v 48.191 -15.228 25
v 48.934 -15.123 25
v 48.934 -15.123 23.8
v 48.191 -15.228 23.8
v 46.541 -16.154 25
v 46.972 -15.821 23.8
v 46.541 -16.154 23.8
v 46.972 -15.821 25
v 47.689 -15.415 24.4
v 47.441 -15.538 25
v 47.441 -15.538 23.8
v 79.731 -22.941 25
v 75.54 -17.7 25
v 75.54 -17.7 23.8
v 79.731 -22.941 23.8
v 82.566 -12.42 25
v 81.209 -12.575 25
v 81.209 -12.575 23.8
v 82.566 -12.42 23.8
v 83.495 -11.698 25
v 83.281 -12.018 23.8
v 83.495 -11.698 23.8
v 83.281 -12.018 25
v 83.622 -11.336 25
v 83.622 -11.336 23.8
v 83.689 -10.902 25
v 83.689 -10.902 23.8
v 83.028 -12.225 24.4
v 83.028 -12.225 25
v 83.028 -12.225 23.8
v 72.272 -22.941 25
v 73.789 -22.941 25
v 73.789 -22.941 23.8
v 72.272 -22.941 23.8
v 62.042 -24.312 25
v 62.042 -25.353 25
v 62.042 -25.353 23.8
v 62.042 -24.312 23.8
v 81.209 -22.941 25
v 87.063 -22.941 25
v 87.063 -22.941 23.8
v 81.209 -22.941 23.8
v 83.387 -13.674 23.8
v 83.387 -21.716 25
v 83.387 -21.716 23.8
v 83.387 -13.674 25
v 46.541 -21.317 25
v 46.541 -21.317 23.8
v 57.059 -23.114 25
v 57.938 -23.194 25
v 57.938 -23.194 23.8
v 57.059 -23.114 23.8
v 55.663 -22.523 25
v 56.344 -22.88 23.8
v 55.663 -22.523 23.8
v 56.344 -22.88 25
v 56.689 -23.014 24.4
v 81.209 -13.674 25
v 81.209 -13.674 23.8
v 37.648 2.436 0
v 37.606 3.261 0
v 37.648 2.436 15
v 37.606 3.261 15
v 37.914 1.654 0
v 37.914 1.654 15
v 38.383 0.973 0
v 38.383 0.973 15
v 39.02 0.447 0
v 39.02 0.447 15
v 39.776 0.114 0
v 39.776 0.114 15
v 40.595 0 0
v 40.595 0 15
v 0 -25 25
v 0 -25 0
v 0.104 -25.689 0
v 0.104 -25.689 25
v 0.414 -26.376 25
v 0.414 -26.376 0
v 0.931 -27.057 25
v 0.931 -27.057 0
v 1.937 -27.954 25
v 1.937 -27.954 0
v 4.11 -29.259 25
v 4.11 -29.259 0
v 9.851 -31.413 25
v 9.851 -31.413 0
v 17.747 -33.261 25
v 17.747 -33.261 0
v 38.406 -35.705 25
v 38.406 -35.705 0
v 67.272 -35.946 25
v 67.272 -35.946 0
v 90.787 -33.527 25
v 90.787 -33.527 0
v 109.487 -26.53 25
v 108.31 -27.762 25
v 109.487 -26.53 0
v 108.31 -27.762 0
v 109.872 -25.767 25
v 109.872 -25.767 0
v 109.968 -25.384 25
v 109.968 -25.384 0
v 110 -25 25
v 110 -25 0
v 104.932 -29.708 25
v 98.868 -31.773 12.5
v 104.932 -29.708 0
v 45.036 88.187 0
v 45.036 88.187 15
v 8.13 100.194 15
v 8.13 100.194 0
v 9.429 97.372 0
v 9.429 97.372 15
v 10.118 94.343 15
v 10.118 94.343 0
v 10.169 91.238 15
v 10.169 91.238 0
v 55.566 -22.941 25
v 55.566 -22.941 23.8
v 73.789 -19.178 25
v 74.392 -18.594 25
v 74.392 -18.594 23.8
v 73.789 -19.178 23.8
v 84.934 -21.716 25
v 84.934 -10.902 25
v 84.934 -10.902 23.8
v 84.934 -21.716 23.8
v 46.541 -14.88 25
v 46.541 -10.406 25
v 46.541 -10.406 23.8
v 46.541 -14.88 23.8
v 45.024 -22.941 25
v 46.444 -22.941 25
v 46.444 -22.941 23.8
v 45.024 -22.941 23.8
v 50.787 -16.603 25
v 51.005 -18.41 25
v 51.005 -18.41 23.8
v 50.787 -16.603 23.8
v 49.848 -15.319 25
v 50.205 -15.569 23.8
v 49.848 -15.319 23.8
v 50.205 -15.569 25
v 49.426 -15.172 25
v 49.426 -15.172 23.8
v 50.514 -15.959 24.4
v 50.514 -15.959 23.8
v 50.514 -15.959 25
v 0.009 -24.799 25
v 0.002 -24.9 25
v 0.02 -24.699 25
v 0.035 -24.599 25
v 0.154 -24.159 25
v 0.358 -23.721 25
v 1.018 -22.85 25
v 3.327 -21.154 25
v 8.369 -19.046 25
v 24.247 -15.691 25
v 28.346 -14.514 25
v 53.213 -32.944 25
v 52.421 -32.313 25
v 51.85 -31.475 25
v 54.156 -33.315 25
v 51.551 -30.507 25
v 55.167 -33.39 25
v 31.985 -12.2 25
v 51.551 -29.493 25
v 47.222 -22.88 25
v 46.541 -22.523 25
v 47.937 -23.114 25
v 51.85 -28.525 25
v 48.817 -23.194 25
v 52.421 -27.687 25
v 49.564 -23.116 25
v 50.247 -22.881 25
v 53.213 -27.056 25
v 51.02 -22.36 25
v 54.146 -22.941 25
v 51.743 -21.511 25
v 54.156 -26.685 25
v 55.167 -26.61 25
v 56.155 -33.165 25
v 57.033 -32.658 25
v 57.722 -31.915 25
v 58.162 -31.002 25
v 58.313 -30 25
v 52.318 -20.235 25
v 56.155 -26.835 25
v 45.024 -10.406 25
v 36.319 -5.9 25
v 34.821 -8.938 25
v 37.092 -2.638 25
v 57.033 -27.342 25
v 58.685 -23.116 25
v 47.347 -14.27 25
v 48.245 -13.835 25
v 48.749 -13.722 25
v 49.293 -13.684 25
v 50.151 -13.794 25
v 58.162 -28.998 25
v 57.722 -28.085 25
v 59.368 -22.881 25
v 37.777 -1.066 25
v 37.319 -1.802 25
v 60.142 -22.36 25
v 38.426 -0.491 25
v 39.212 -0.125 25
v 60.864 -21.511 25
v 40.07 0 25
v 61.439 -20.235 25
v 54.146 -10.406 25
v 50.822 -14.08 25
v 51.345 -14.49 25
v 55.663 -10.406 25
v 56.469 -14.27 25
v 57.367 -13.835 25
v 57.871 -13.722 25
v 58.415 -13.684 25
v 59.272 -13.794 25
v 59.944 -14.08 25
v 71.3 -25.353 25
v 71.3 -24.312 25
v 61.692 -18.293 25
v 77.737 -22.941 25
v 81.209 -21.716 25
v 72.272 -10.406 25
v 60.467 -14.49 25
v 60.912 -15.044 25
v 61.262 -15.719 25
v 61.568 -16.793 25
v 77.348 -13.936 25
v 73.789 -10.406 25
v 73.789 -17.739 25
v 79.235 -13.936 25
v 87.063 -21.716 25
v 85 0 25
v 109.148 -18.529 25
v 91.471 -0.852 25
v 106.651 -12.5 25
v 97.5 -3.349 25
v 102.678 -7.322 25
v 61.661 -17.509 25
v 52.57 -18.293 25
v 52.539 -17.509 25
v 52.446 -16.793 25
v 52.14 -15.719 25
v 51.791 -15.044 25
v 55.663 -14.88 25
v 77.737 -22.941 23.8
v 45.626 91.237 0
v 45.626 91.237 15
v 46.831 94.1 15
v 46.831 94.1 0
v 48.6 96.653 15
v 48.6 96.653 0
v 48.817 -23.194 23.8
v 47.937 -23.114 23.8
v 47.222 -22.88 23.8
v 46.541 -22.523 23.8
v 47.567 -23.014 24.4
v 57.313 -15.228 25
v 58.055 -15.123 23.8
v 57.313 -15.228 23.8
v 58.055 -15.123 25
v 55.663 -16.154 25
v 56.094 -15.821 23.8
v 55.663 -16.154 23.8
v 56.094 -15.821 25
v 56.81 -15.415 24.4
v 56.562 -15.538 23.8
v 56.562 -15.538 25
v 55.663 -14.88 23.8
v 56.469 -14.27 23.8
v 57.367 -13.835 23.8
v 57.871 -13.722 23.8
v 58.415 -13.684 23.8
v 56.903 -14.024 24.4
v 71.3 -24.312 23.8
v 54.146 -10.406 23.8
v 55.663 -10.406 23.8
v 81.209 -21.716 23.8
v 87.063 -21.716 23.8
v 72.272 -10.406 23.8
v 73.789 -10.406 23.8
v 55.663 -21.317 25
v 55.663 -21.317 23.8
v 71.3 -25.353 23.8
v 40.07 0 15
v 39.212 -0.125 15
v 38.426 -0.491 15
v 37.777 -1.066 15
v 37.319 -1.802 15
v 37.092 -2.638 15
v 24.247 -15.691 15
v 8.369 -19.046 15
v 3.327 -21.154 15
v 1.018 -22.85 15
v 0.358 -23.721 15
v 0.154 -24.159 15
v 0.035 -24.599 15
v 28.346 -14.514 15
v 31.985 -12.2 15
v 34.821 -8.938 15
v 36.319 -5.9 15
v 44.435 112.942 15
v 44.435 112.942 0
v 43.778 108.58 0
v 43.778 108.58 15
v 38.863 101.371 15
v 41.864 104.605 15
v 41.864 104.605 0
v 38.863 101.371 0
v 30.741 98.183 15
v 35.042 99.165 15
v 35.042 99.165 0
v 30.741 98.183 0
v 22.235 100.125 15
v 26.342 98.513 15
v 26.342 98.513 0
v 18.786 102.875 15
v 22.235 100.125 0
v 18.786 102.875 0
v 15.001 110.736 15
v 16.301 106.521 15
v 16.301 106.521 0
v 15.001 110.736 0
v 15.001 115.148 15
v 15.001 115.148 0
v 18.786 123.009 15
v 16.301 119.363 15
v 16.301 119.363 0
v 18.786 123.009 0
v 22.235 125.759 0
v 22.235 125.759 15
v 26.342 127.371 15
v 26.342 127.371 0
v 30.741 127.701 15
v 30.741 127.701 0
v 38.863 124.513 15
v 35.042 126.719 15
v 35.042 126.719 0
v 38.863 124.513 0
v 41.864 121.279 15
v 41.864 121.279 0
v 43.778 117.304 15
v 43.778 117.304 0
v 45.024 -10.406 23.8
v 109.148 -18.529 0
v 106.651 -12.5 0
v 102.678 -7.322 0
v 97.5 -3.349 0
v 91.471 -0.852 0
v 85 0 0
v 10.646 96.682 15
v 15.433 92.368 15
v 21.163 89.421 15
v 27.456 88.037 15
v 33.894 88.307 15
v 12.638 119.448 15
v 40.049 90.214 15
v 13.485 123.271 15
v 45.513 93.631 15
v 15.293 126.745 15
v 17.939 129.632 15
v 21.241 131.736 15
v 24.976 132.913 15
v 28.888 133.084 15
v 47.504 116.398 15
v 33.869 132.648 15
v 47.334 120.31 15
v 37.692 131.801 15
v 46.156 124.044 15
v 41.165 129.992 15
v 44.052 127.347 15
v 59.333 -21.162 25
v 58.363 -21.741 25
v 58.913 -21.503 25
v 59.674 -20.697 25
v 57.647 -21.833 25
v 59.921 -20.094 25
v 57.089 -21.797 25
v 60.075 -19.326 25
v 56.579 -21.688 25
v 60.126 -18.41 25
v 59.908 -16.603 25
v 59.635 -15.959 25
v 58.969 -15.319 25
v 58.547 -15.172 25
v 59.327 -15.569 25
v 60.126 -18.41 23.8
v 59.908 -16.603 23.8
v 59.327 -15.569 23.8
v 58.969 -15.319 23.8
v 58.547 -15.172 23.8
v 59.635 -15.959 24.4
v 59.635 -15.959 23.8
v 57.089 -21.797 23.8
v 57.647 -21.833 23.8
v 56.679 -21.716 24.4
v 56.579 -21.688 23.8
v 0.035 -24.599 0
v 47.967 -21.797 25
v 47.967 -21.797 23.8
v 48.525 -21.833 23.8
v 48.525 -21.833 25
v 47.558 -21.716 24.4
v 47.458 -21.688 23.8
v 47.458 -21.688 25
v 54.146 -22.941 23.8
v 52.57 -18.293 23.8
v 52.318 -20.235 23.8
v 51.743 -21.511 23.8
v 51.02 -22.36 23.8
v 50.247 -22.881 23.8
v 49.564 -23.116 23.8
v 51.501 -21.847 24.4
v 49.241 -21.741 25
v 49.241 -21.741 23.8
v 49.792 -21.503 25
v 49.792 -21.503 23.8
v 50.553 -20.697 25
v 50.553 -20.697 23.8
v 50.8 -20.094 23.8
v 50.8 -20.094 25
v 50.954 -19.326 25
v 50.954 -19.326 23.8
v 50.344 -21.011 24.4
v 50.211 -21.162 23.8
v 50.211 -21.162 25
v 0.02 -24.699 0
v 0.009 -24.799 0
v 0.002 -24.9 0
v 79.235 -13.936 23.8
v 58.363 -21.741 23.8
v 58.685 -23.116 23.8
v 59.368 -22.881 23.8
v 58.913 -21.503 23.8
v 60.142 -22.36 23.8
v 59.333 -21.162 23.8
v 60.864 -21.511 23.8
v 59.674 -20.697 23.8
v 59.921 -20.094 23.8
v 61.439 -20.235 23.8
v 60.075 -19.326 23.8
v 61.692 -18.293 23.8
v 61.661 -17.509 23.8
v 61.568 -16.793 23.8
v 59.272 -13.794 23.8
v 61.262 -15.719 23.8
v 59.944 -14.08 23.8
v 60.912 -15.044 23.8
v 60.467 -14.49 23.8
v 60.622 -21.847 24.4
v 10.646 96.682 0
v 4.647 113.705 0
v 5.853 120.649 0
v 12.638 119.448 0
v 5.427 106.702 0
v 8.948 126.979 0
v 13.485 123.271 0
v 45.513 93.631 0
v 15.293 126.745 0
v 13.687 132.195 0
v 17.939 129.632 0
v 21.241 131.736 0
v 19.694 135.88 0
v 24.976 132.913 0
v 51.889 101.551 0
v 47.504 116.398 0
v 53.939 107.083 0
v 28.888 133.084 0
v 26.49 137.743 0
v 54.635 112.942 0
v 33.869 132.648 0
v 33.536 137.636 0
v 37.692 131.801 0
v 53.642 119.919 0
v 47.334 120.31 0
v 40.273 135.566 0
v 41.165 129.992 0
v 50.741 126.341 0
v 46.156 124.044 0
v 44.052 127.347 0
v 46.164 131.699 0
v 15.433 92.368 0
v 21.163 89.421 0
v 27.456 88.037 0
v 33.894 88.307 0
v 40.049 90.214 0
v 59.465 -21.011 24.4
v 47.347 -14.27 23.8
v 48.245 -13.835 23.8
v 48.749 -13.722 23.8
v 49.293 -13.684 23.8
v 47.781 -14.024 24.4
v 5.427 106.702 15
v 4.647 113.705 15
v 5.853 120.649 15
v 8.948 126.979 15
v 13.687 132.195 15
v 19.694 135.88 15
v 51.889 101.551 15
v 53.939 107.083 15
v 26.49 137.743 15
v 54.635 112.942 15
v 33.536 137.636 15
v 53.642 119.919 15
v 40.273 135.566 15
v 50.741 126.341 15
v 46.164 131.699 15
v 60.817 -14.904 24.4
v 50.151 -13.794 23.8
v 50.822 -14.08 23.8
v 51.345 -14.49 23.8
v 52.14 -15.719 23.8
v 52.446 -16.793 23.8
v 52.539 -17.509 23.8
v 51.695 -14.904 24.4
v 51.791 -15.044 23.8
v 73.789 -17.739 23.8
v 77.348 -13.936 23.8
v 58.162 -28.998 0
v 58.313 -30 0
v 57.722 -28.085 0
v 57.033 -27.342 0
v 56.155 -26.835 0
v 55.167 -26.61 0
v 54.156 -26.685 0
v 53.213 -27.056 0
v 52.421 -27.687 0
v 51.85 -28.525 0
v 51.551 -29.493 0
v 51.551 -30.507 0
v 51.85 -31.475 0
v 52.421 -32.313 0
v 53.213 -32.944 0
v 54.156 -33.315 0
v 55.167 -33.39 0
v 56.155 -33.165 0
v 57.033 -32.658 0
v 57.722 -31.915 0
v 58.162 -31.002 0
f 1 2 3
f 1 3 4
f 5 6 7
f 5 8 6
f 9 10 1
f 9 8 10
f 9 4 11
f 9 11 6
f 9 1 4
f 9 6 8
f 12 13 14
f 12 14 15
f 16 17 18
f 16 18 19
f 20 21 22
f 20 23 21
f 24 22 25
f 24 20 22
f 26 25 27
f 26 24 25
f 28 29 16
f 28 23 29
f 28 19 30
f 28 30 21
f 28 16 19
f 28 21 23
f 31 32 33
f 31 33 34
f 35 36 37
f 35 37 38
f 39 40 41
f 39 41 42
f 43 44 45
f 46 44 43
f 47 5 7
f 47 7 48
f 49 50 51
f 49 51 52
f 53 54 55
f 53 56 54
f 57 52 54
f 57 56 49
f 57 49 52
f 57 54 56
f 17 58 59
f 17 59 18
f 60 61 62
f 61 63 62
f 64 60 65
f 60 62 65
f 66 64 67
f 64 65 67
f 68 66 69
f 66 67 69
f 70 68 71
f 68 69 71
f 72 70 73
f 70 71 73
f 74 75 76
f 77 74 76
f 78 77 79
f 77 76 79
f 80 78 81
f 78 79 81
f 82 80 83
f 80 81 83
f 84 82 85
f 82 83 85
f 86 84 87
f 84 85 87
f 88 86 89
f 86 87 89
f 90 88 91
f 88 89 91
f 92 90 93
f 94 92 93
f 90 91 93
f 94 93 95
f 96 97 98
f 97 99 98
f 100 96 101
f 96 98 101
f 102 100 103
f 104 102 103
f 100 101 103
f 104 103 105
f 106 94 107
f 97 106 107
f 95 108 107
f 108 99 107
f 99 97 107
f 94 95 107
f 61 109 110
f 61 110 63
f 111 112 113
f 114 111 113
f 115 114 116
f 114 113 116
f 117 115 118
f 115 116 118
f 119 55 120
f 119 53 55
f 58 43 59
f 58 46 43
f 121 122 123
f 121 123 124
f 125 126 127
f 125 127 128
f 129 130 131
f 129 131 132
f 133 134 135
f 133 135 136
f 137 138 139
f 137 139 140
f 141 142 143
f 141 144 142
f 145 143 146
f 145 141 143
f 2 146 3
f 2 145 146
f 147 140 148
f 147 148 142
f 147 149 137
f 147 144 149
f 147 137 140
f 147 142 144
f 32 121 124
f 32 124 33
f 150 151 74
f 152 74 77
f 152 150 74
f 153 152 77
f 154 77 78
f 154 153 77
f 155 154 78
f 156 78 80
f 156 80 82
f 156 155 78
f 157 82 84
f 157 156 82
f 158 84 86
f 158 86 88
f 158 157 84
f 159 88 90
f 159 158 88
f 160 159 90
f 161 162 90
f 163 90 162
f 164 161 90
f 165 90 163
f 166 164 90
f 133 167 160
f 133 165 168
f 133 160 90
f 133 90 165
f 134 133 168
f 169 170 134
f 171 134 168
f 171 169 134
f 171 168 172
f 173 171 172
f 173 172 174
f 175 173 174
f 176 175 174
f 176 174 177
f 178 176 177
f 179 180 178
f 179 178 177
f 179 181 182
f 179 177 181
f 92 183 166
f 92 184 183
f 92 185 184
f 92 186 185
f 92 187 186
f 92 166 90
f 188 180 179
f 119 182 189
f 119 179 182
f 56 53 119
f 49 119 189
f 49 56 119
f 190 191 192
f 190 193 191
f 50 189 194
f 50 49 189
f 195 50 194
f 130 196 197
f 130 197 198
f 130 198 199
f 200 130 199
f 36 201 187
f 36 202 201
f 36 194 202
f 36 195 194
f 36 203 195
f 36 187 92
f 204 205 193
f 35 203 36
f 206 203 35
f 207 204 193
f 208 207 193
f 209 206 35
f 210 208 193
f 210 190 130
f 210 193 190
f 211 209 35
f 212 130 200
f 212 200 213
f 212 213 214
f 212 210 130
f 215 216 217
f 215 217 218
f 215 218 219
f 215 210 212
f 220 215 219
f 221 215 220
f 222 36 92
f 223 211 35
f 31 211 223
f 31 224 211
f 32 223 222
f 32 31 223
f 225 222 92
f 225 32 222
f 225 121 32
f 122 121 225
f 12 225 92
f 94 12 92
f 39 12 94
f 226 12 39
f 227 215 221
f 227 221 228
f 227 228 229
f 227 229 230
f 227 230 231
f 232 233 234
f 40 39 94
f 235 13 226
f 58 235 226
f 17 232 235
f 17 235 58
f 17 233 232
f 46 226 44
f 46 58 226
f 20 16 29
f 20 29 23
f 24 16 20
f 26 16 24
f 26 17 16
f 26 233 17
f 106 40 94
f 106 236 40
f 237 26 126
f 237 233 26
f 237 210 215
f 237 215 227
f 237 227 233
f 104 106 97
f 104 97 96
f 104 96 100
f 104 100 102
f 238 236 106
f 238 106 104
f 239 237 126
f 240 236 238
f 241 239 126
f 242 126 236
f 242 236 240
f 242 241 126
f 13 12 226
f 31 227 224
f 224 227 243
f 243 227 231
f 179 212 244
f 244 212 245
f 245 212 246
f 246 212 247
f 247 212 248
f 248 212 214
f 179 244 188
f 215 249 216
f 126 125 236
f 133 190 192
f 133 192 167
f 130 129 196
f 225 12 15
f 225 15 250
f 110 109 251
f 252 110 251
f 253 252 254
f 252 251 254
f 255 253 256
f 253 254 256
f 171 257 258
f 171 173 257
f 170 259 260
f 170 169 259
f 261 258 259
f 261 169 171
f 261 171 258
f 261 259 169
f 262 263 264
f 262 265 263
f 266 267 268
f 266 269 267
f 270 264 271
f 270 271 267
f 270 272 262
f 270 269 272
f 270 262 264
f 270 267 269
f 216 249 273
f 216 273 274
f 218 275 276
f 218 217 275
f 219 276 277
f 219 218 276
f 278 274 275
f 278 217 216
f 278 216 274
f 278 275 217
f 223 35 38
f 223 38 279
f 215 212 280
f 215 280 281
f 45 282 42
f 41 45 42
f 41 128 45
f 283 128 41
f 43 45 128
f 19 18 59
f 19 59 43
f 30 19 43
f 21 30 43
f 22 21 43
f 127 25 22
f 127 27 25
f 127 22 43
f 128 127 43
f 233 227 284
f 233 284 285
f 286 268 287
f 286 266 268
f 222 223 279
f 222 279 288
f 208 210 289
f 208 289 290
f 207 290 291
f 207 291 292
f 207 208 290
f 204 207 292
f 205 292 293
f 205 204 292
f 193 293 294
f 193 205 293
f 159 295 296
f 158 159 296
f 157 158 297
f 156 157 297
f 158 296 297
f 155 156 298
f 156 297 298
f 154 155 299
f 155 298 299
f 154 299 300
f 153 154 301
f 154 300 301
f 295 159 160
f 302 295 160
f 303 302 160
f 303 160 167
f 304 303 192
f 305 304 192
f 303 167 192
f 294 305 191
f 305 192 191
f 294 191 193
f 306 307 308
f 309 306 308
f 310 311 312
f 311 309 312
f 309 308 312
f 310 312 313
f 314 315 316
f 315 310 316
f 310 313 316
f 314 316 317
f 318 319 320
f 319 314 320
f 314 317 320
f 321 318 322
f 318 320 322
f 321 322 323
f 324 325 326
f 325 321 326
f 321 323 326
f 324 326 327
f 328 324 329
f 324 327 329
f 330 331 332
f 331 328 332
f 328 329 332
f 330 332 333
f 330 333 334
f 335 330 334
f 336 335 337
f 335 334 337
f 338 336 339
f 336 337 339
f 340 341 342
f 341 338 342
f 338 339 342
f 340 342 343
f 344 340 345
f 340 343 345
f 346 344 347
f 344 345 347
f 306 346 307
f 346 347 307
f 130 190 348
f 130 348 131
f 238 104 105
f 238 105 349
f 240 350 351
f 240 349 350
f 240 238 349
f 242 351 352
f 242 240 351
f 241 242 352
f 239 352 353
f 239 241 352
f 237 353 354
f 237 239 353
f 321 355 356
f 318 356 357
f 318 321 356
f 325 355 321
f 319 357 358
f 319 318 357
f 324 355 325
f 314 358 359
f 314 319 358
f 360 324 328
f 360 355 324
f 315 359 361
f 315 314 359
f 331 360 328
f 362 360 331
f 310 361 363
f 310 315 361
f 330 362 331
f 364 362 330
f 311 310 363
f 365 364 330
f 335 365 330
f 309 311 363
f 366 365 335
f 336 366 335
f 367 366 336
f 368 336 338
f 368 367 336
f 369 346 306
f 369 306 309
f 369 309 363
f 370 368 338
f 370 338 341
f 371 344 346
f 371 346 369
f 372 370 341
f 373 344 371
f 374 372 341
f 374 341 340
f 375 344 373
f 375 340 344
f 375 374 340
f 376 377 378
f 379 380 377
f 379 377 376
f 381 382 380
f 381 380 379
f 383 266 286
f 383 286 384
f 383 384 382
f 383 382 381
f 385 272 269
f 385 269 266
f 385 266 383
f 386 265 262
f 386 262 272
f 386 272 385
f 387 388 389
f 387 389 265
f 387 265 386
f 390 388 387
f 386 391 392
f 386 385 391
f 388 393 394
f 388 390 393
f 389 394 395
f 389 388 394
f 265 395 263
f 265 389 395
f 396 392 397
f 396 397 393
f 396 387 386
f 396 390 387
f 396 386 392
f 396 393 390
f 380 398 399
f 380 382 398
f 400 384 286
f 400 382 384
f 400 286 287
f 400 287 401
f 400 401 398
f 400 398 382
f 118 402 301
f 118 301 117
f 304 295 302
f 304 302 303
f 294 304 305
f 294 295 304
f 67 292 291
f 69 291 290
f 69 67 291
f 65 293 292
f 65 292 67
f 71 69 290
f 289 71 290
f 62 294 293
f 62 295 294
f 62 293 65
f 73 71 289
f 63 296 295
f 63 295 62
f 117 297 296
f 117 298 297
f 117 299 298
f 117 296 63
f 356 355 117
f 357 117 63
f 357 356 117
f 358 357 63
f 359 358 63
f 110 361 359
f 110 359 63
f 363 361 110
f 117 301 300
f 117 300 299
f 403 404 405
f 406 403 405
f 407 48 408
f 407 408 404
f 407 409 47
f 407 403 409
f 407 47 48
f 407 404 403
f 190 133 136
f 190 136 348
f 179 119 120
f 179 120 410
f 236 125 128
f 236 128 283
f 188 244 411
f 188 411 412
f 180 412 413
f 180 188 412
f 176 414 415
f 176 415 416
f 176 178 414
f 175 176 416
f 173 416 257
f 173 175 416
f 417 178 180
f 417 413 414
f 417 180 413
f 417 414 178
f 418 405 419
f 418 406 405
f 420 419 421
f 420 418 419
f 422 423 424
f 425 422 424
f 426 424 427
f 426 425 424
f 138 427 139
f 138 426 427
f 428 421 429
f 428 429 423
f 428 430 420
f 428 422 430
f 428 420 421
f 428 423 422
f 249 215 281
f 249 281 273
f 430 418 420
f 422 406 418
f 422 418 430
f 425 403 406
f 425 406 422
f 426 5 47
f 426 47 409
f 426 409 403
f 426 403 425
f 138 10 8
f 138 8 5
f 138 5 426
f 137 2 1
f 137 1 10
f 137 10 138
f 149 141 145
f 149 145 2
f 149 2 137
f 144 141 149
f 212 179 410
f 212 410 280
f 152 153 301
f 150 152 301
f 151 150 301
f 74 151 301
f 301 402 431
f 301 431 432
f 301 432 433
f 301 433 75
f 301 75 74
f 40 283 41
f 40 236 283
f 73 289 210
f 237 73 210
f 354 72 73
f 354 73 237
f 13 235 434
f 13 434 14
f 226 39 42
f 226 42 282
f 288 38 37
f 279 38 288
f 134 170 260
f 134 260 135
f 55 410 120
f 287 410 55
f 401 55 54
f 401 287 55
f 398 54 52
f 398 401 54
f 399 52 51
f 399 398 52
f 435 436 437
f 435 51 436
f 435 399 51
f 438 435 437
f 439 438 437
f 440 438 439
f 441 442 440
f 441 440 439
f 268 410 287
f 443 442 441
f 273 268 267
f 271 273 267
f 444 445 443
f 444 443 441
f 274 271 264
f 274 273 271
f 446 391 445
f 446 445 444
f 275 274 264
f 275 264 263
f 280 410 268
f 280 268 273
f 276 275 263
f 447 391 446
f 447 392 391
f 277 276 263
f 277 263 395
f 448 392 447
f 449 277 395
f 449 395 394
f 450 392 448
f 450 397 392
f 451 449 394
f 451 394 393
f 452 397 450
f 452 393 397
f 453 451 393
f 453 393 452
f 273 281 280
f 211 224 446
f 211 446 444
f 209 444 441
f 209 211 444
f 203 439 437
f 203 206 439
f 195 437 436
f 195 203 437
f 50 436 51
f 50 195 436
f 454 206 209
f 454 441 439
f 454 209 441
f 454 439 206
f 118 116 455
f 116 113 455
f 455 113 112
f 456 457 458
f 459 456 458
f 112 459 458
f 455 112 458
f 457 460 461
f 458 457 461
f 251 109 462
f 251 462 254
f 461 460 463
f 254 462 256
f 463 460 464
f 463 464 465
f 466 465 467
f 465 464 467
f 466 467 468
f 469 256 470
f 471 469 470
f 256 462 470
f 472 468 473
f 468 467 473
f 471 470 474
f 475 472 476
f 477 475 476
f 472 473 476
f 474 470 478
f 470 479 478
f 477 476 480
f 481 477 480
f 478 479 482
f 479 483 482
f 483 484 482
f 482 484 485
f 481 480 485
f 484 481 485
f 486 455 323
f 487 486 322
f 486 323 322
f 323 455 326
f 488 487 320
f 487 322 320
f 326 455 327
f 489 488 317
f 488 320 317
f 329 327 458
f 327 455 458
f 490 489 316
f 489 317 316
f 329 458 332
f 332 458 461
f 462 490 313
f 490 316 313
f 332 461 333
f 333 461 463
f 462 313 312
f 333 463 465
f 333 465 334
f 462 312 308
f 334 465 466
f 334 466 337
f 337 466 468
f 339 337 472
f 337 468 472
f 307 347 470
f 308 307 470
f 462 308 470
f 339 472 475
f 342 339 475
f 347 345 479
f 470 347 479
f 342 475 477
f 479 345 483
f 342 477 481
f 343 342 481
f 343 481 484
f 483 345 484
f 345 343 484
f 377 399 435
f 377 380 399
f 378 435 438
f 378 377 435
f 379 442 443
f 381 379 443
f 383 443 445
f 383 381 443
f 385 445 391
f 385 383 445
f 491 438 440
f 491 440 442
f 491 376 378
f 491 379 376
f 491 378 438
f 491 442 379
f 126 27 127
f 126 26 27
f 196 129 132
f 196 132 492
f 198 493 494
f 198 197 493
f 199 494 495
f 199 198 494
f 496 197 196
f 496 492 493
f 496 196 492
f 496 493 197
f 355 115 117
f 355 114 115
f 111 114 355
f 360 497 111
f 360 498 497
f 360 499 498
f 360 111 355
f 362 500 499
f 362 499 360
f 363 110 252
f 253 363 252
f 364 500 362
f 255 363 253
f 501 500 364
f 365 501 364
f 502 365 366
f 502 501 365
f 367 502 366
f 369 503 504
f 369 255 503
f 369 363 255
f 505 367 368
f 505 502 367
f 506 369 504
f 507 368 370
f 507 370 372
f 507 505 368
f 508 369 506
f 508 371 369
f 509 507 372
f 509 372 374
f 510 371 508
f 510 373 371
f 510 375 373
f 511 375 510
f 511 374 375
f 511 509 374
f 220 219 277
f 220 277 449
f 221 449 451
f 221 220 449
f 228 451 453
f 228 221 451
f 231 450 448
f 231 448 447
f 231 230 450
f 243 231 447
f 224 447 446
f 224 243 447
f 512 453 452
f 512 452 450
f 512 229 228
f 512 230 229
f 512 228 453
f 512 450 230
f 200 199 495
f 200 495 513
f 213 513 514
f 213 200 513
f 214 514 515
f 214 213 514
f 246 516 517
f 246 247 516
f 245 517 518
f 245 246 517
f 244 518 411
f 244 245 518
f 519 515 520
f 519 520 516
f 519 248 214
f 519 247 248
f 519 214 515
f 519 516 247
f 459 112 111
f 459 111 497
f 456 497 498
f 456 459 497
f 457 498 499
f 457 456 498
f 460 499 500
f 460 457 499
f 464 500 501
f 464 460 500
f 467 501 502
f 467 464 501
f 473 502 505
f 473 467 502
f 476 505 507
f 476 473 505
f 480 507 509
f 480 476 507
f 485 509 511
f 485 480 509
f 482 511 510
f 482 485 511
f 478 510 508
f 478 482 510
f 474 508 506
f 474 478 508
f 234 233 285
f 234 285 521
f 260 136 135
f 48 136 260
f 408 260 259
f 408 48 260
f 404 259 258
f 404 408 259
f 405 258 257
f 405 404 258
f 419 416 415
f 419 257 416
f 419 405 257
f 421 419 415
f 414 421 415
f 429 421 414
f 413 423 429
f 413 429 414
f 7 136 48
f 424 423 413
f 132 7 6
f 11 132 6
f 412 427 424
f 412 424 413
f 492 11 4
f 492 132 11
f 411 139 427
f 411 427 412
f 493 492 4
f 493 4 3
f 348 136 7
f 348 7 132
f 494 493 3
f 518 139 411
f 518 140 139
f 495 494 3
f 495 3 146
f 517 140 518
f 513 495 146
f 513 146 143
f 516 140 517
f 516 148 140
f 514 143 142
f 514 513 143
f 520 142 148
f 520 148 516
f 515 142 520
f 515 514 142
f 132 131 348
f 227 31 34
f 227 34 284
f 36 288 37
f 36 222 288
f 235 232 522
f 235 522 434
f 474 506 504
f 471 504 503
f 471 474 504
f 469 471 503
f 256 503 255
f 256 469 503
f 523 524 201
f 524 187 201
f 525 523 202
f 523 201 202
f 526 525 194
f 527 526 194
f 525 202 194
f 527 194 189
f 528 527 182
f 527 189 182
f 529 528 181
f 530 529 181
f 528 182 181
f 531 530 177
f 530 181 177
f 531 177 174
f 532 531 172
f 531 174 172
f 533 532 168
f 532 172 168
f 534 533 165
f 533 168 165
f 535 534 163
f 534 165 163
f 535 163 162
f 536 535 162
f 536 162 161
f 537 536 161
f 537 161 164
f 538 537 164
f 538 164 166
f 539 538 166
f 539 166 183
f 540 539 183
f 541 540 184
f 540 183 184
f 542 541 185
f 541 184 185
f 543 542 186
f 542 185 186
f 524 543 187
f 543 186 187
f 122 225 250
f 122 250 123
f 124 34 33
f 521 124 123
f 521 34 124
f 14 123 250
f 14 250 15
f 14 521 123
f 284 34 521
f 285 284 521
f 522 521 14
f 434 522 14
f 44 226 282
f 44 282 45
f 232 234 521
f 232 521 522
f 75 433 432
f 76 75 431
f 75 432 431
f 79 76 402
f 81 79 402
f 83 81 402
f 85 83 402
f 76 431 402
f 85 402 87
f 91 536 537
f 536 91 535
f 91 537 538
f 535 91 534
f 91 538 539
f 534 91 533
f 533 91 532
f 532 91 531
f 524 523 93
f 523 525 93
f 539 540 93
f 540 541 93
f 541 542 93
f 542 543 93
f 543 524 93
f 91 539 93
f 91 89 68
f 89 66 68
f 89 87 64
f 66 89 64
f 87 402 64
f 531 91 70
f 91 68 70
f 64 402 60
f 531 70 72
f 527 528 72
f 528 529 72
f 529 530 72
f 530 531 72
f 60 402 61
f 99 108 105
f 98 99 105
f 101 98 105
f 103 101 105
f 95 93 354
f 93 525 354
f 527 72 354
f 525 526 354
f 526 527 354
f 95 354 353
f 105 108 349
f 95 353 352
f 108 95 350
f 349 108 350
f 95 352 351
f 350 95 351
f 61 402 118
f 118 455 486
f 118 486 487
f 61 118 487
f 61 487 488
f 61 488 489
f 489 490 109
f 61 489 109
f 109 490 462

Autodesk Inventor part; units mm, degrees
ref_plane "YZ Plane" through (0, 0, 0) normal (1, 0, 0) x (0, 1, 0)
ref_plane "XZ Plane" through (0, 0, 0) normal (0, 1, 0) x (-1, 0, 0)
ref_plane "XY Plane" through (0, 0, 0) normal (0, 0, 1) x (1, 0, 0)
sketch "スケッチ1" plane through (0, 0, 0) normal (0, 0, 1) x (1, 0, 0)
  point P0 (0, 0)
sketch "スケッチ2" plane through (0, 0, 0) normal (0, 0, 1) x (1, 0, 0)
  line L0 (0, 0) -> (110, 0)
  line L1 (110, 0) -> (110, -25)
  line L2 (110, -25) -> (0, -25)
  line L3 (0, -25) -> (0, 0)
  ellipse E0 centre (55, -25) end of major axis (110, -25) minor radius 11.2287
  line L4 (0, -25) -> (13.9449, 134.3912)
  line L5 (13.9449, 134.3912) -> (48.8117, 131.3407)
  line L6 (48.8117, 131.3407) -> (34.8668, -28.0505)
  line L7 (34.8668, -28.0505) -> (0, -25)
  circle A0 centre (29.6352, 112.942) radius 14.8
  circle A1 centre (29.6352, 112.942) radius 25
  point P0 (0.0351, -24.599)
  point P1 (36.056, -14.4584)
  point P2 (37.3209, 0)
  dimension "d0" = 110
  dimension "d1" = 25
  dimension "d2" = 35
  dimension "d4" = 160
  dimension "d5" = 5
  dimension "d6" = 29.6
  dimension "d7" = 17.5
  dimension "d18" = 20
  dimension "d23" = 50
extrude "押し出し1" add sketch "スケッチ2" along normal blind 15 contours L4 A1 L6 L0 | L0 L6 E0 L4 | L4 A1 L5 L6 | L4 L5 A1 | A1 L5 L6
extrude "押し出し2" add sketch "スケッチ2" along normal blind 25 contours L4 E0 L6 L2 | L7 L6 L2 E0 | E0 L4 | L2 L6 L7 | L0 L1 E0 L6 | L6 E0 L2
fillet "フィレット1" radius 3 2 edges at (37.3209, 0, 20) (37.3209, 0, 7.5)
fillet "フィレット2" radius 25 1 edges at (110, 0, 12.5)
fillet "フィレット3" radius 15 2 edges at (48.8117, 131.3407, 7.5) (13.9449, 134.3912, 7.5)
fillet "フィレット4" radius 15 1 edges at (36.056, -14.4584, 20)
sketch "スケッチ3" plane through (0, 0, 25) normal (0, 0, 1) x (1, 0, 0)
  line L0 (43.9254, -10.4065) -> (55.2208, -10.4065) construction
  line L1 (55.2208, -10.4065) -> (55.2208, -14.2029) construction
  line L2 (55.2208, -14.2029) -> (43.9254, -14.2029) construction
  line L3 (43.9254, -14.2029) -> (43.9254, -10.4065) construction
  spline S0 degree 2 poles (52.5705, -18.2931) (52.5705, -20.5005) (50.4311, -23.1942) (48.8168, -23.1942) knots 0 0 0 1 2 2 2
  spline S1 degree 2 poles (48.8168, -23.1942) (48.0875, -23.1942) (47.047, -22.8344) (46.5413, -22.5232) knots 0 0 0 1 2 2 2
  line L4 (46.5413, -22.5232) -> (46.444, -22.9414)
  line L5 (46.444, -22.9414) -> (45.0243, -22.9414)
  line L6 (45.0243, -22.9414) -> (45.0243, -10.4065)
  line L7 (45.0243, -10.4065) -> (46.5413, -10.4065)
  line L8 (46.5413, -10.4065) -> (46.5413, -14.8798)
  spline S2 degree 2 poles (46.5413, -14.8798) (47.115, -14.3644) (48.4473, -13.6837) (49.2933, -13.6837) knots 0 0 0 1 2 2 2
  spline S3 degree 2 poles (49.2933, -13.6837) (50.8201, -13.6837) (52.5705, -16.1245) (52.5705, -18.2931) knots 0 0 0 1 2 2 2
  spline S4 degree 2 poles (51.0048, -18.4098) (51.0048, -16.7955) (50.0226, -15.1229) (48.9335, -15.1229) knots 0 0 0 1 2 2 2
  spline S5 degree 2 poles (48.9335, -15.1229) (48.3209, -15.1229) (47.0567, -15.7064) (46.5413, -16.1537) knots 0 0 0 1 2 2 2
  line L9 (46.5413, -16.1537) -> (46.5413, -21.3174)
  spline S6 degree 2 poles (46.5413, -21.3174) (47.115, -21.5994) (48, -21.8328) (48.5251, -21.8328) knots 0 0 0 1 2 2 2
  spline S7 degree 2 poles (48.5251, -21.8328) (49.6823, -21.8328) (51.0048, -20.1893) (51.0048, -18.4098) knots 0 0 0 1 2 2 2
  spline S8 degree 2 poles (61.692, -18.2931) (61.692, -20.5005) (59.5526, -23.1942) (57.9384, -23.1942) knots 0 0 0 1 2 2 2
  spline S9 degree 2 poles (57.9384, -23.1942) (57.209, -23.1942) (56.1685, -22.8344) (55.6628, -22.5232) knots 0 0 0 1 2 2 2
  line L10 (55.6628, -22.5232) -> (55.5656, -22.9414)
  line L11 (55.5656, -22.9414) -> (54.1458, -22.9414)
  line L12 (54.1458, -22.9414) -> (54.1458, -10.4065)
  line L13 (54.1458, -10.4065) -> (55.6628, -10.4065)
  line L14 (55.6628, -10.4065) -> (55.6628, -14.8798)
  spline S10 degree 2 poles (55.6628, -14.8798) (56.2366, -14.3644) (57.5688, -13.6837) (58.4149, -13.6837) knots 0 0 0 1 2 2 2
  spline S11 degree 2 poles (58.4149, -13.6837) (59.9416, -13.6837) (61.692, -16.1245) (61.692, -18.2931) knots 0 0 0 1 2 2 2
  spline S12 degree 2 poles (60.1264, -18.4098) (60.1264, -16.7955) (59.1442, -15.1229) (58.0551, -15.1229) knots 0 0 0 1 2 2 2
  spline S13 degree 2 poles (58.0551, -15.1229) (57.4424, -15.1229) (56.1782, -15.7064) (55.6628, -16.1537) knots 0 0 0 1 2 2 2
  line L15 (55.6628, -16.1537) -> (55.6628, -21.3174)
  spline S14 degree 2 poles (55.6628, -21.3174) (56.2366, -21.5994) (57.1215, -21.8328) (57.6466, -21.8328) knots 0 0 0 1 2 2 2
  spline S15 degree 2 poles (57.6466, -21.8328) (58.8038, -21.8328) (60.1264, -20.1893) (60.1264, -18.4098) knots 0 0 0 1 2 2 2
  line L16 (71.2998, -25.353) -> (62.0421, -25.353)
  line L17 (62.0421, -25.353) -> (62.0421, -24.3125)
  line L18 (62.0421, -24.3125) -> (71.2998, -24.3125)
  line L19 (71.2998, -24.3125) -> (71.2998, -25.353)
  line L20 (79.7309, -22.9414) -> (77.7374, -22.9414)
  line L21 (77.7374, -22.9414) -> (74.3922, -18.5945)
  line L22 (74.3922, -18.5945) -> (73.7893, -19.178)
  line L23 (73.7893, -19.178) -> (73.7893, -22.9414)
  line L24 (73.7893, -22.9414) -> (72.2722, -22.9414)
  line L25 (72.2722, -22.9414) -> (72.2722, -10.4065)
  line L26 (72.2722, -10.4065) -> (73.7893, -10.4065)
  line L27 (73.7893, -10.4065) -> (73.7893, -17.7388)
  line L28 (73.7893, -17.7388) -> (77.3484, -13.9365)
  line L29 (77.3484, -13.9365) -> (79.235, -13.9365)
  line L30 (79.235, -13.9365) -> (75.5397, -17.6999)
  line L31 (75.5397, -17.6999) -> (79.7309, -22.9414)
  line L32 (87.0632, -22.9414) -> (81.209, -22.9414)
  line L33 (81.209, -22.9414) -> (81.209, -21.7161)
  line L34 (81.209, -21.7161) -> (83.3873, -21.7161)
  line L35 (83.3873, -21.7161) -> (83.3873, -13.674)
  line L36 (83.3873, -13.674) -> (81.209, -13.674)
  line L37 (81.209, -13.674) -> (81.209, -12.5751)
  spline S16 degree 2 poles (81.209, -12.5751) (82.444, -12.5751) (83.611, -11.8749) (83.6888, -10.9025) knots 0 0 0 1 2 2 2
  line L38 (83.6888, -10.9025) -> (84.9335, -10.9025)
  line L39 (84.9335, -10.9025) -> (84.9335, -21.7161)
  line L40 (84.9335, -21.7161) -> (87.0632, -21.7161)
  line L41 (87.0632, -21.7161) -> (87.0632, -22.9414)
  point P0 (0, 0)
extrude "押し出し3" cut sketch "スケッチ3" against normal blind 1.2
sketch "スケッチ4" plane through (0, 0, 25) normal (0, 0, 1) x (1, 0, 0)
  circle A0 centre (54.913, -30) radius 3.4
  line L0 (85, 0) -> (40.0699, 0) projected
  point P0 (0, 0)
  dimension "d19" = 6.8
  dimension "d22" = 30
extrude "押し出し4" cut sketch "スケッチ4" against normal blind 40
extrude "押し出し5" add sketch "スケッチ2" along normal blind 15 contours A1 L4 | L4 A1 L5 L6 | L6 A1 | A1 L5
fillet "フィレット5" radius 15 2 edges at (45.5126, 93.6312, 7.5) (10.6458, 96.6816, 7.5)
equation "\"d7\" = 0.5 * d2"
properties part number "passive_walking_robot1"
